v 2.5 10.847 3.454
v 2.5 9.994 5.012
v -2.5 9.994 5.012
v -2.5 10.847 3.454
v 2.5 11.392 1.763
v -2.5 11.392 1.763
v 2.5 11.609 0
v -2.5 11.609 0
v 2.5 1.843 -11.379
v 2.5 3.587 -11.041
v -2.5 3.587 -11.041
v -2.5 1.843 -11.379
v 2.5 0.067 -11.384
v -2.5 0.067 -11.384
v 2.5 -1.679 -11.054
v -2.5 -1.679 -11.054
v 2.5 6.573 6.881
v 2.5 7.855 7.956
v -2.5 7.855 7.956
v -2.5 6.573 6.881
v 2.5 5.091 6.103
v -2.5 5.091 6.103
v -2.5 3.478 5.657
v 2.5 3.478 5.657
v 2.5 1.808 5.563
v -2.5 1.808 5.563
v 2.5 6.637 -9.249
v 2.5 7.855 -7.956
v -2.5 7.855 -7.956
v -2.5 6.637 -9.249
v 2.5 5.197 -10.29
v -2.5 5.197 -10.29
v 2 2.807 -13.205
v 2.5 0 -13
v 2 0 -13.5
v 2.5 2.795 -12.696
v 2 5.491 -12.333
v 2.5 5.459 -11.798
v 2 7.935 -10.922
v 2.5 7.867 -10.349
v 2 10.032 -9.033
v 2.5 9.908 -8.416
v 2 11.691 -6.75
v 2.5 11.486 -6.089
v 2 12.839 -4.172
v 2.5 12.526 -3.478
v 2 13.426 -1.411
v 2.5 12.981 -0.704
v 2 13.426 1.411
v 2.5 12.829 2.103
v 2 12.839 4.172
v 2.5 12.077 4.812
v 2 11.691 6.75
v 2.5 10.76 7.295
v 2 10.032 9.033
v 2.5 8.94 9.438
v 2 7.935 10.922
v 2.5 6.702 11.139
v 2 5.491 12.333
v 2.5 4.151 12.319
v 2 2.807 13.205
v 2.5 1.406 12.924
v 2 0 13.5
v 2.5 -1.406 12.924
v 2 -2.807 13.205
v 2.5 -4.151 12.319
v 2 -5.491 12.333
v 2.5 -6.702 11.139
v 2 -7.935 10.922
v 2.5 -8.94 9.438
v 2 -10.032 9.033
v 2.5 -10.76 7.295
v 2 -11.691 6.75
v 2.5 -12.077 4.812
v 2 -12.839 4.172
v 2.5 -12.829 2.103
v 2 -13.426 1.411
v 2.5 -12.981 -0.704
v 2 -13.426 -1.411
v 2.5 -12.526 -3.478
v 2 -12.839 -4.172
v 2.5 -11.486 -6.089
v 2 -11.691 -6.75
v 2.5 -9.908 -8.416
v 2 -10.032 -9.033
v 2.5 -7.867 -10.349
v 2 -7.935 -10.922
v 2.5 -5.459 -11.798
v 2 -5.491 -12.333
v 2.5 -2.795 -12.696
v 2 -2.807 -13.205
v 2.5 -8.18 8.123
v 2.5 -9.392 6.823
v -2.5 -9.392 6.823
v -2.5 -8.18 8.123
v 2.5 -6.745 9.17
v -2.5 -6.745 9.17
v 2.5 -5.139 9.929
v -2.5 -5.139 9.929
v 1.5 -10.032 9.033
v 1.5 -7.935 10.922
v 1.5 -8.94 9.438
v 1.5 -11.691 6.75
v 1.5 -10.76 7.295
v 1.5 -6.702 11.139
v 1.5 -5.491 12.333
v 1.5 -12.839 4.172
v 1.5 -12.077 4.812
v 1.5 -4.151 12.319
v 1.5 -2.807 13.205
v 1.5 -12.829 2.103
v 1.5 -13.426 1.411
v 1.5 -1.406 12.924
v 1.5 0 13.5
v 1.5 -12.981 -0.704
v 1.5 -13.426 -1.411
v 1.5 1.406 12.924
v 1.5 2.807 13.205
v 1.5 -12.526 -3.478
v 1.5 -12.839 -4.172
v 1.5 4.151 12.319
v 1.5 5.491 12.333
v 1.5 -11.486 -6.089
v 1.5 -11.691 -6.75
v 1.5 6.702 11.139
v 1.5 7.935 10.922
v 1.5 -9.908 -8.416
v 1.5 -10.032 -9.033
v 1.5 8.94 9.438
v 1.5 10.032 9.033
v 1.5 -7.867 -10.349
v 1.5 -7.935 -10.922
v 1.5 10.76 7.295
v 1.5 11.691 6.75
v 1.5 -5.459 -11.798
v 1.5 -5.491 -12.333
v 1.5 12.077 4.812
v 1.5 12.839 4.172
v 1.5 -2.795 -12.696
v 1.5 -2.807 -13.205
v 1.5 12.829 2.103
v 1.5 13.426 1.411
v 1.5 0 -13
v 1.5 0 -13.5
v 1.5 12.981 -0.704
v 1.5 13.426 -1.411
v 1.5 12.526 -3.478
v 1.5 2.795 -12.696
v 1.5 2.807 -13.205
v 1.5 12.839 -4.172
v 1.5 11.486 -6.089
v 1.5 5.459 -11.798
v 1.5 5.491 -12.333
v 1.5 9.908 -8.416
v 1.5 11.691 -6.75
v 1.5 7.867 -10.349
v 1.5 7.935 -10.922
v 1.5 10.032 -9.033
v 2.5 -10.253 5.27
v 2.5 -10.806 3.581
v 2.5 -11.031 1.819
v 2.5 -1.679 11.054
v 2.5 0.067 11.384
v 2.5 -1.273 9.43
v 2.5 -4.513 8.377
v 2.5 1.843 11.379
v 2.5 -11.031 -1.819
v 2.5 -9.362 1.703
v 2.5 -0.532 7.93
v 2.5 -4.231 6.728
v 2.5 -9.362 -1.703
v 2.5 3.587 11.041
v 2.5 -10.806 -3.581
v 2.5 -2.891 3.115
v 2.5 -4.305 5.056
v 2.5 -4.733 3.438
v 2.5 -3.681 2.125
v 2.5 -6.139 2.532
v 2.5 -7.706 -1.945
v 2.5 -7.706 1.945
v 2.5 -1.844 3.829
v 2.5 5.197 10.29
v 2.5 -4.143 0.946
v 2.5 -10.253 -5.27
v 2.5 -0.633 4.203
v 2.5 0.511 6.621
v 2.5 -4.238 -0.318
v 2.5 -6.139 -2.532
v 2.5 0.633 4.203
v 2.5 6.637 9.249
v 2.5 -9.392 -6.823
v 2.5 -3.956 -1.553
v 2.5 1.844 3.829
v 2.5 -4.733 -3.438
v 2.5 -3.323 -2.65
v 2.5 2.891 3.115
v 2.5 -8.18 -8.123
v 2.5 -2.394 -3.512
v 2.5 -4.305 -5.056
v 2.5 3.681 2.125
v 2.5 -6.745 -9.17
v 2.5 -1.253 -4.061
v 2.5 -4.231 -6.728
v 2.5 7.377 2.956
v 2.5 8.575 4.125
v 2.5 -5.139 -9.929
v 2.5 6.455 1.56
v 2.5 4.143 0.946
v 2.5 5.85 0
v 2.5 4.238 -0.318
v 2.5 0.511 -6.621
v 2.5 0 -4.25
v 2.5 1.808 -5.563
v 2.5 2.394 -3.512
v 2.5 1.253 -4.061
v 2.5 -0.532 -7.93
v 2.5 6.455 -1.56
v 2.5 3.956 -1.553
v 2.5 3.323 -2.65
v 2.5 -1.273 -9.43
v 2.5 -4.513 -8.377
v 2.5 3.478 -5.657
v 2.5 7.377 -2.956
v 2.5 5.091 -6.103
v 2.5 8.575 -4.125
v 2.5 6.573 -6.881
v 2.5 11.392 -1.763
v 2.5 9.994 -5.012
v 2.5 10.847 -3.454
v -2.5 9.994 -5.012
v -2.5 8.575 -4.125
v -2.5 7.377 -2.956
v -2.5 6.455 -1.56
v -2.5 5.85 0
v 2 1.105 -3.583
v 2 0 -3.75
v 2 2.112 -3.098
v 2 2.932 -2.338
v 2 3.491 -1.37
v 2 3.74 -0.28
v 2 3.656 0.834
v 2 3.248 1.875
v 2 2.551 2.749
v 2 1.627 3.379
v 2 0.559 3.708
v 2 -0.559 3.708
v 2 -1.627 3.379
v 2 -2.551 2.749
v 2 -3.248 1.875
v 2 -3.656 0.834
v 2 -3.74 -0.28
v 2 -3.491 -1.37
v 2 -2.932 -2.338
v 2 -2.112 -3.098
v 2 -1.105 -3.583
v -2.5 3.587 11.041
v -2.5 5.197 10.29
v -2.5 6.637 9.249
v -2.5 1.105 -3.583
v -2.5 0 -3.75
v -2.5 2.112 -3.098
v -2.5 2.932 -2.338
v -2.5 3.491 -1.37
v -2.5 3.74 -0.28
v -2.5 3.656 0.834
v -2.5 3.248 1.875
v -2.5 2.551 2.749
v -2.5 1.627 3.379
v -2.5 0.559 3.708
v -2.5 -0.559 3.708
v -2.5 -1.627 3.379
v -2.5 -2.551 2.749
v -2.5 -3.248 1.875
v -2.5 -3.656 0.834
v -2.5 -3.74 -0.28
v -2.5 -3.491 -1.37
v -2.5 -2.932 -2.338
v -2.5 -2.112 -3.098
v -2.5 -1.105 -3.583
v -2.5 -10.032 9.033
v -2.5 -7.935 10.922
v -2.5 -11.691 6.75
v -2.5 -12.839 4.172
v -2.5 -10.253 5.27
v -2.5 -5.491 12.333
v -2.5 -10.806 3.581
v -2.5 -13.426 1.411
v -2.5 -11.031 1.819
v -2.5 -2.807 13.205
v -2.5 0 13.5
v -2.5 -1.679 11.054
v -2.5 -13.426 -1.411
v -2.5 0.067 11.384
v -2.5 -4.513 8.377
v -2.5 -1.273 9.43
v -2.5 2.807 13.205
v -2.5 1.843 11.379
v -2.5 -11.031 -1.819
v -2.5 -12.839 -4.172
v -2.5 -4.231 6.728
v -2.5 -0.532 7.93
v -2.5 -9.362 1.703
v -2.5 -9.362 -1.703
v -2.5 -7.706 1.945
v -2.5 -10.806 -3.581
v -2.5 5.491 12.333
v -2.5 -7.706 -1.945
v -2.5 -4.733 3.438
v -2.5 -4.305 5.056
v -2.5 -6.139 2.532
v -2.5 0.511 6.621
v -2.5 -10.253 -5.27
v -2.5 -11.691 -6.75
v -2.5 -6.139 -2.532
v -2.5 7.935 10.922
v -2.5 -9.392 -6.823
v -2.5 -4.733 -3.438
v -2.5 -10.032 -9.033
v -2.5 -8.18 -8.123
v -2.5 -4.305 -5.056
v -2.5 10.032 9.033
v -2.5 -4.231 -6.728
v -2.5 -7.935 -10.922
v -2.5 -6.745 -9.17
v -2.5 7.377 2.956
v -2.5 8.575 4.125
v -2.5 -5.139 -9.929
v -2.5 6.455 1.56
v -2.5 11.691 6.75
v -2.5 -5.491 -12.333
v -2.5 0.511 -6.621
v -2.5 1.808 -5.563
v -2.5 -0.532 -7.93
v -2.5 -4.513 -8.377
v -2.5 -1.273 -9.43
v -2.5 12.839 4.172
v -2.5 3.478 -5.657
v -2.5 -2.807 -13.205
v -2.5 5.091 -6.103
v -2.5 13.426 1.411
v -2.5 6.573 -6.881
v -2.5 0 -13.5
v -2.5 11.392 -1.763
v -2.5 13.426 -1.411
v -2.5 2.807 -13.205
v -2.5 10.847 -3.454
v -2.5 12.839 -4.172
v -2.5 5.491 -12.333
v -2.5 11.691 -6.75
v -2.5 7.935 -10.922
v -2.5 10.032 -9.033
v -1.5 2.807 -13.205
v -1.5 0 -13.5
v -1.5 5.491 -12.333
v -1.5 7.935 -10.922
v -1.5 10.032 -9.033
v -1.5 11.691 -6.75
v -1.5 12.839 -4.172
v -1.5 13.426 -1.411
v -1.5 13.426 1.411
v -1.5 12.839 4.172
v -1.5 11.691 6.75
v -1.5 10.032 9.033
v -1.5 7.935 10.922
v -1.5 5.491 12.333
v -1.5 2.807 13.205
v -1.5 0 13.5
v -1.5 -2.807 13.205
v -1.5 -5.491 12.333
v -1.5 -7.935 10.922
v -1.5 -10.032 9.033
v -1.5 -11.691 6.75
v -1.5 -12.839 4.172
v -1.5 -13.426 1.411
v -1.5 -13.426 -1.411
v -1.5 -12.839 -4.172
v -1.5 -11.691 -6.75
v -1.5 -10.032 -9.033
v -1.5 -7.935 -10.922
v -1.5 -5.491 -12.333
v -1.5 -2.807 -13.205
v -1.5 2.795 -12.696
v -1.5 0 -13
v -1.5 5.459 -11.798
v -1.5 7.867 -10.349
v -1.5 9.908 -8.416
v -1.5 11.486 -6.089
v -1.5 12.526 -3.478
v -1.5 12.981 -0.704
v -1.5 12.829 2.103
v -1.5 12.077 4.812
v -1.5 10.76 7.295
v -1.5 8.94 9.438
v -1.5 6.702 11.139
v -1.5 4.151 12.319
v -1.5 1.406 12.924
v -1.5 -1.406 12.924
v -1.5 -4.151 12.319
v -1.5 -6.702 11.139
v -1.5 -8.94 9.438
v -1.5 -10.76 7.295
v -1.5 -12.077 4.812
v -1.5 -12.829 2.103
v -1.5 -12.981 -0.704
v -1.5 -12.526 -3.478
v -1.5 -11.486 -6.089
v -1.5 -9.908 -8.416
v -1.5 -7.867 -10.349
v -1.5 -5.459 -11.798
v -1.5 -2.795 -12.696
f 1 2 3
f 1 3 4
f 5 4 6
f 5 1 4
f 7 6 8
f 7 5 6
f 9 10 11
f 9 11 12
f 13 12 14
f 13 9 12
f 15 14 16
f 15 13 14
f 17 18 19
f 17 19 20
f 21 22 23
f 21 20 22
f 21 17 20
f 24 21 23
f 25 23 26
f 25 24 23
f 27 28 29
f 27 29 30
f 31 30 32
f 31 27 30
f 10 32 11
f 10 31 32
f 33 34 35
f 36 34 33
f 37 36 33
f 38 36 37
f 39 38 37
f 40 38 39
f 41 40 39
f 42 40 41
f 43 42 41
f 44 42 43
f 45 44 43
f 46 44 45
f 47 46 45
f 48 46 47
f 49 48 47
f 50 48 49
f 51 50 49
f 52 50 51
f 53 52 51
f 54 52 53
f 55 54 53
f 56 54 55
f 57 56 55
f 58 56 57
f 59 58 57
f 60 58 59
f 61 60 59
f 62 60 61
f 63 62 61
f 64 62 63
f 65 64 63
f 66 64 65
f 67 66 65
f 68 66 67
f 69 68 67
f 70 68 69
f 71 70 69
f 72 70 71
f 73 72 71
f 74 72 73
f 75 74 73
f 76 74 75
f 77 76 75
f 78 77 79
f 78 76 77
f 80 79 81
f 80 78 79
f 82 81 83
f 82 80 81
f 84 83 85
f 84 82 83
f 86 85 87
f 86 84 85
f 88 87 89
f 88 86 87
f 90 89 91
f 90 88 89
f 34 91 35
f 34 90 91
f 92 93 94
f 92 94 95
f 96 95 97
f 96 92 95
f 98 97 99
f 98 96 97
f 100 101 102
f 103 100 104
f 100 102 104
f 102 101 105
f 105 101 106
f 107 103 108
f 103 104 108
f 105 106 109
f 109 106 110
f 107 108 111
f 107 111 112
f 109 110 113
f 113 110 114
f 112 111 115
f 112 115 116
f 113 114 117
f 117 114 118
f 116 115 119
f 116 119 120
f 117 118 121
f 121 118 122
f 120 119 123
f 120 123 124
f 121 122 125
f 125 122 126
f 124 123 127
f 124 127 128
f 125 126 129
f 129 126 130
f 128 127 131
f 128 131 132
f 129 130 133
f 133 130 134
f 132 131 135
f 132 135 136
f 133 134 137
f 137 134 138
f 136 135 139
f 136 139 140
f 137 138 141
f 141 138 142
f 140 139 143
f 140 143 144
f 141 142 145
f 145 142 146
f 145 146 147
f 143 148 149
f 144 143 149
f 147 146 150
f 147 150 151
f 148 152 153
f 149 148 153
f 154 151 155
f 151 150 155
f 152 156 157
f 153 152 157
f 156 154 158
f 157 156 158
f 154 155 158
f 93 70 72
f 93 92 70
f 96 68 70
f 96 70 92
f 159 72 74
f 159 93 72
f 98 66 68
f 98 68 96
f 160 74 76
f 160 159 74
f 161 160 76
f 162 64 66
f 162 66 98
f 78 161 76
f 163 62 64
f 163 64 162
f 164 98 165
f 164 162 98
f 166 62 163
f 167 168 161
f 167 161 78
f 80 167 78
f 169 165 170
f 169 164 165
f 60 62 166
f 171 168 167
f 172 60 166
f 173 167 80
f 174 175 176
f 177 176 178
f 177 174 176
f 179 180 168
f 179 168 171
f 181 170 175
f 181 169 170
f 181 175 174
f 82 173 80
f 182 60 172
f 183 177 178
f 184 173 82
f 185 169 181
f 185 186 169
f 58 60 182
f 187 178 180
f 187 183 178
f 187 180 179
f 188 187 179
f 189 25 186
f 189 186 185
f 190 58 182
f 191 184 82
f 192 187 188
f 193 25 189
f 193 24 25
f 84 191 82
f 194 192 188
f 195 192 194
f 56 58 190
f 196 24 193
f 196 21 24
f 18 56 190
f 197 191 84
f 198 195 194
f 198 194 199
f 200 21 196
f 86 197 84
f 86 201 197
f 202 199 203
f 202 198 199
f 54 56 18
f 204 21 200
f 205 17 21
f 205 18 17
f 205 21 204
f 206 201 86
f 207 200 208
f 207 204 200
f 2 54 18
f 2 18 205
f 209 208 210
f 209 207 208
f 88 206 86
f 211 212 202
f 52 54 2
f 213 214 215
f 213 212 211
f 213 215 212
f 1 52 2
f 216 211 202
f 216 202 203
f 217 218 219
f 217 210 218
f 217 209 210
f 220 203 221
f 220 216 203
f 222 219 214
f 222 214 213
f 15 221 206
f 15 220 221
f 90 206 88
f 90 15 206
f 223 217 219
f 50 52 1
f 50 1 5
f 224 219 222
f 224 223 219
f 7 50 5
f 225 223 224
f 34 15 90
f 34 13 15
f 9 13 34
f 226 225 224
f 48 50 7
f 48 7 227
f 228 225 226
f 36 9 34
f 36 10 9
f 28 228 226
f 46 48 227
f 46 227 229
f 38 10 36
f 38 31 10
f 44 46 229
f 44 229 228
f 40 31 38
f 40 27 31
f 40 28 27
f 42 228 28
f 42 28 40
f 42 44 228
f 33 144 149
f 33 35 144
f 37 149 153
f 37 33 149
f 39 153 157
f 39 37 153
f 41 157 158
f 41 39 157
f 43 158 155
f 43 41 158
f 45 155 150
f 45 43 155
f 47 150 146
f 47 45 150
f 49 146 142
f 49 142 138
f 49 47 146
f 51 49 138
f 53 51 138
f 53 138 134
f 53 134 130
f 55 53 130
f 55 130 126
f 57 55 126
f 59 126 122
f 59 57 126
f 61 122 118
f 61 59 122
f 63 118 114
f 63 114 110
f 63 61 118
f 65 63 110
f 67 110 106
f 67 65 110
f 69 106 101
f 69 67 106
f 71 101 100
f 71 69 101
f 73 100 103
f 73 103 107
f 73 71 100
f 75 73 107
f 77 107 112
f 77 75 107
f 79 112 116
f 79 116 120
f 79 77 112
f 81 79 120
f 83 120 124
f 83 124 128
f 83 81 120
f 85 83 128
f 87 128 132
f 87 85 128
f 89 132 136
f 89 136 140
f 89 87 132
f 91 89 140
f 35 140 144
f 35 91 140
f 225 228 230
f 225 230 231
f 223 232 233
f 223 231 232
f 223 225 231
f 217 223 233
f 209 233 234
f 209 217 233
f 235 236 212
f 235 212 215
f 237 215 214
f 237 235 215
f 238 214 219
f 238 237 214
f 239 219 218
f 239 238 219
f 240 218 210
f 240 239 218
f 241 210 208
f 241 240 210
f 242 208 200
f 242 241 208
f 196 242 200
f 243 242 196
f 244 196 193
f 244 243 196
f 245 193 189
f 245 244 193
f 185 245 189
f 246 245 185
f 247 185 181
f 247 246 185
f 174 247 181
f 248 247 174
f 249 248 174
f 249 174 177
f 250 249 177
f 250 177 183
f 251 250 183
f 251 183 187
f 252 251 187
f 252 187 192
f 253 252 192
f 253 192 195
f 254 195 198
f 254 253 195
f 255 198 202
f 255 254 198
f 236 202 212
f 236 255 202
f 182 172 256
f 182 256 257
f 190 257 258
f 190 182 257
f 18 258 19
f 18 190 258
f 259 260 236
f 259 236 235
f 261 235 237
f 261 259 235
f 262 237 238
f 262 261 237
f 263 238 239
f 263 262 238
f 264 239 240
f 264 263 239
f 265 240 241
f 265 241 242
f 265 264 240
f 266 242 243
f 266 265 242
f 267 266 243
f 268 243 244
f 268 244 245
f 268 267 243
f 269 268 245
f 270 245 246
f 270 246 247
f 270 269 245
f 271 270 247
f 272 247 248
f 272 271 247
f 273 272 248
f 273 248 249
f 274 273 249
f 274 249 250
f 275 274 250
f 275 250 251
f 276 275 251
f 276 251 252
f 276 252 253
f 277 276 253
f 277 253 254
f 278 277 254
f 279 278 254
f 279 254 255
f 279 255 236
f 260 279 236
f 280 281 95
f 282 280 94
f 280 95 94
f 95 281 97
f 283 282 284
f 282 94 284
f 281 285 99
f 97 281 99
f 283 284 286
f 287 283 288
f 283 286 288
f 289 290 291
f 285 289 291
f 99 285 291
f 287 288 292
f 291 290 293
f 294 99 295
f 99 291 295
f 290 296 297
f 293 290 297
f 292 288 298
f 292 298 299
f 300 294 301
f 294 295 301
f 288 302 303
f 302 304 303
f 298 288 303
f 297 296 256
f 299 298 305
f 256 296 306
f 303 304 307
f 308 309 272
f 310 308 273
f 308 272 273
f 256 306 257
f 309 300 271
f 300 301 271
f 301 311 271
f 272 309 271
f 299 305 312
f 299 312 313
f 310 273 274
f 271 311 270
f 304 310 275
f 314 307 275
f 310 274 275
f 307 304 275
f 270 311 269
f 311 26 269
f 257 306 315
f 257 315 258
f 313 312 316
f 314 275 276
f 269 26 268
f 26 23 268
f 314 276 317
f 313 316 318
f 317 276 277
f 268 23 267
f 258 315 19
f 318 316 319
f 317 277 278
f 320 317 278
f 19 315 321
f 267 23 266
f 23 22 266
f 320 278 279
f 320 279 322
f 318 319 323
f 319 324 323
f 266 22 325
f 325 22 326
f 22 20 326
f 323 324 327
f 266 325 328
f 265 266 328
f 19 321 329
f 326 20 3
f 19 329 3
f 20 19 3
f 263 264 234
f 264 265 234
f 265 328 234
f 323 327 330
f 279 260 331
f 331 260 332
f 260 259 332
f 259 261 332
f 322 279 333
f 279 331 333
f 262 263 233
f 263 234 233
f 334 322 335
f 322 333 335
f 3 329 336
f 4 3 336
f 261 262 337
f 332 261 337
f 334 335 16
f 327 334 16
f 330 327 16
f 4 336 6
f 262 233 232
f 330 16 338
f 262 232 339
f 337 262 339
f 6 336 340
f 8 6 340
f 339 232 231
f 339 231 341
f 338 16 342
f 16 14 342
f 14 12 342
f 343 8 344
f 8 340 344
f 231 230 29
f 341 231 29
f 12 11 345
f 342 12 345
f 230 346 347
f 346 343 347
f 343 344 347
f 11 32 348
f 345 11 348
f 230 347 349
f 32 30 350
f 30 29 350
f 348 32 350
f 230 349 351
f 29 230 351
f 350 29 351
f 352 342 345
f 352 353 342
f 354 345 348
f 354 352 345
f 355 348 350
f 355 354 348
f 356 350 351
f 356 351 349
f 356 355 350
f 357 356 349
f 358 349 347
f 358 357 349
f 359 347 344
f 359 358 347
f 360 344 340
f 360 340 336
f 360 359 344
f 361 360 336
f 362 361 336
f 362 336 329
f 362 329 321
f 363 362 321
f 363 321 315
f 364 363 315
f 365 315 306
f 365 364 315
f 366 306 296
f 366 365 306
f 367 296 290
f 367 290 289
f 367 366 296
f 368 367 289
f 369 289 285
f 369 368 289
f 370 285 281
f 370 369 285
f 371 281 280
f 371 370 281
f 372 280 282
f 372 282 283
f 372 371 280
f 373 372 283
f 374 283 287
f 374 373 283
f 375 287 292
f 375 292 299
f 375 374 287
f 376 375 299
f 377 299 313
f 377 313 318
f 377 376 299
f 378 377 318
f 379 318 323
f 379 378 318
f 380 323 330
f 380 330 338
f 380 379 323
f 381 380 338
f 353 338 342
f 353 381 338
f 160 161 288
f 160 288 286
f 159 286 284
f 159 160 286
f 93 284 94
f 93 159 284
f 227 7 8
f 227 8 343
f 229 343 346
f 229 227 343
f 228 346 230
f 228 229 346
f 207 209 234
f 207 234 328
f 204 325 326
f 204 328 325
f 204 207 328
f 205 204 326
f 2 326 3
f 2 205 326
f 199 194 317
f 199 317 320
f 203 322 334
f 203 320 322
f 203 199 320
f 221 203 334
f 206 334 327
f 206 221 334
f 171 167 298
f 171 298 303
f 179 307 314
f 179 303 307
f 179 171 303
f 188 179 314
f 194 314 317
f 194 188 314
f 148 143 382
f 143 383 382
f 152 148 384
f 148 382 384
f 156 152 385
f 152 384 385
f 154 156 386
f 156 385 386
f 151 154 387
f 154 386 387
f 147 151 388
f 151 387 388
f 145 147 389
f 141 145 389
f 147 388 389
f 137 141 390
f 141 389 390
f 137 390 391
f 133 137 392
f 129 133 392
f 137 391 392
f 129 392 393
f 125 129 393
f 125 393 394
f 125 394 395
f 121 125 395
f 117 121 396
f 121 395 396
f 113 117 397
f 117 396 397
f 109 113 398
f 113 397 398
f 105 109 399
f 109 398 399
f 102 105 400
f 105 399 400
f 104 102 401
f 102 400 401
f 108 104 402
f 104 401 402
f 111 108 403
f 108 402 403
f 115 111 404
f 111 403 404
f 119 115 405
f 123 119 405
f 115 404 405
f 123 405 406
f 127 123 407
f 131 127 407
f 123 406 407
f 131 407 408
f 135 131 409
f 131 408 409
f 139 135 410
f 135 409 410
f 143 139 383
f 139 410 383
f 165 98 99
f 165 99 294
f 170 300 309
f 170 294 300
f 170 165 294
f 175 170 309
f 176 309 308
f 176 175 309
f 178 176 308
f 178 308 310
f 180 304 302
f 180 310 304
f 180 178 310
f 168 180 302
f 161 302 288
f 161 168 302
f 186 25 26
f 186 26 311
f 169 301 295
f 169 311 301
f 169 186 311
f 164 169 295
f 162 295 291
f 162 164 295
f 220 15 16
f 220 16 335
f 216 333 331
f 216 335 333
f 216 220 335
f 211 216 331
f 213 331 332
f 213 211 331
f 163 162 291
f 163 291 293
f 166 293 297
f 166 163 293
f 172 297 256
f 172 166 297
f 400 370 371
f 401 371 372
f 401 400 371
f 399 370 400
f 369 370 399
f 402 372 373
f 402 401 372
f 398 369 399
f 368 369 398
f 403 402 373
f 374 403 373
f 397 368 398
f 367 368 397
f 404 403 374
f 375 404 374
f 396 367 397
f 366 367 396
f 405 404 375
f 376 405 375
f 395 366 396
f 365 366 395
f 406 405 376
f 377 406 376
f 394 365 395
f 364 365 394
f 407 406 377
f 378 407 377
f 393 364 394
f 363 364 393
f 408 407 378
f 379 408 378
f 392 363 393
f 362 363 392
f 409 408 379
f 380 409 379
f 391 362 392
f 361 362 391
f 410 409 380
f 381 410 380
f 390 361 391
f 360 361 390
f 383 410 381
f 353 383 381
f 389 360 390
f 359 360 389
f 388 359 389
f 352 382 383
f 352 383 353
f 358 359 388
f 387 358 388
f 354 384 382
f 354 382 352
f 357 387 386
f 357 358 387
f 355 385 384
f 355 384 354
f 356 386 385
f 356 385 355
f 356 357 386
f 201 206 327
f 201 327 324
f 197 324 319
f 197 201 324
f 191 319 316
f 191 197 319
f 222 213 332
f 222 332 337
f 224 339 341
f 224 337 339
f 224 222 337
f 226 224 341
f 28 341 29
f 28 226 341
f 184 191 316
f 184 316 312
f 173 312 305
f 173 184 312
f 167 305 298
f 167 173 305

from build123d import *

# Parameters (mm, degrees)
SKETCH1_R           = 13.5
SKETCH1_R_2         = 3.75
BOSS_EXTRUDE1_DEPTH = 2.5
CUT_EXTRUDE1_DEPTH  = 20.254869514
CIRPATTERN1_COUNT   = 5
CHAMFER1_SIZE       = 0.5
SKETCH4_R           = 13.5
SKETCH4_R_2         = 13
CUT_EXTRUDE3_DEPTH  = 1.5


with BuildPart() as part:
    # Sketch1 → Boss-Extrude1 (new, symmetric)
    with BuildSketch(Plane(origin=(0, 0, 0), x_dir=(0, 0, -1), z_dir=(1, 0, 0))):
        Circle(SKETCH1_R)
        Circle(SKETCH1_R_2, mode=Mode.SUBTRACT)
    extrude(amount=BOSS_EXTRUDE1_DEPTH, both=True)

    # Sketch2 → Cut-Extrude1 (cut, symmetric)
    with BuildSketch(Plane(origin=(0, 0, 0), x_dir=(0, 0, -1), z_dir=(1, 0, 0))):
        with BuildLine():
            ThreePointArc((0, 5.849695328), (-2.956289657, 7.377375059), (-5.012219469, 9.99397715))
            ThreePointArc((-5.012219469, 9.99397715), (-2.621563936, 11.159720287), (0, 11.6087119))
            ThreePointArc((0, 11.6087119), (2.621563936, 11.159720287), (5.012219469, 9.99397715))
            ThreePointArc((5.012219469, 9.99397715), (2.956289657, 7.377375059), (0, 5.849695328))
        make_face()
    cut_extrude1 = extrude(amount=CUT_EXTRUDE1_DEPTH, both=True, mode=Mode.SUBTRACT)

    # CirPattern1: Cut-Extrude1 ×5 about axis
    cirpattern1_axis = Axis((0, 0, 0), (1, 0, 0))
    for i in range(1, CIRPATTERN1_COUNT):
        add(cut_extrude1.rotate(cirpattern1_axis, i * 360 / CIRPATTERN1_COUNT), mode=Mode.SUBTRACT)

    # Chamfer1
    chamfer1_edges = [part.edges().sort_by_distance(p)[0] for p in [
        (2.5, 0, 13.5),
        (2.5, 0, 3.75),
    ]]
    chamfer(chamfer1_edges, length=CHAMFER1_SIZE)

    # Sketch4 → Cut-Extrude3 (cut, symmetric)
    with BuildSketch(Plane(origin=(0, 0, 0), x_dir=(0, 0, -1), z_dir=(1, 0, 0))):
        Circle(SKETCH4_R)
        Circle(SKETCH4_R_2, mode=Mode.SUBTRACT)
    extrude(amount=CUT_EXTRUDE3_DEPTH, both=True, mode=Mode.SUBTRACT)


solid = part.part
